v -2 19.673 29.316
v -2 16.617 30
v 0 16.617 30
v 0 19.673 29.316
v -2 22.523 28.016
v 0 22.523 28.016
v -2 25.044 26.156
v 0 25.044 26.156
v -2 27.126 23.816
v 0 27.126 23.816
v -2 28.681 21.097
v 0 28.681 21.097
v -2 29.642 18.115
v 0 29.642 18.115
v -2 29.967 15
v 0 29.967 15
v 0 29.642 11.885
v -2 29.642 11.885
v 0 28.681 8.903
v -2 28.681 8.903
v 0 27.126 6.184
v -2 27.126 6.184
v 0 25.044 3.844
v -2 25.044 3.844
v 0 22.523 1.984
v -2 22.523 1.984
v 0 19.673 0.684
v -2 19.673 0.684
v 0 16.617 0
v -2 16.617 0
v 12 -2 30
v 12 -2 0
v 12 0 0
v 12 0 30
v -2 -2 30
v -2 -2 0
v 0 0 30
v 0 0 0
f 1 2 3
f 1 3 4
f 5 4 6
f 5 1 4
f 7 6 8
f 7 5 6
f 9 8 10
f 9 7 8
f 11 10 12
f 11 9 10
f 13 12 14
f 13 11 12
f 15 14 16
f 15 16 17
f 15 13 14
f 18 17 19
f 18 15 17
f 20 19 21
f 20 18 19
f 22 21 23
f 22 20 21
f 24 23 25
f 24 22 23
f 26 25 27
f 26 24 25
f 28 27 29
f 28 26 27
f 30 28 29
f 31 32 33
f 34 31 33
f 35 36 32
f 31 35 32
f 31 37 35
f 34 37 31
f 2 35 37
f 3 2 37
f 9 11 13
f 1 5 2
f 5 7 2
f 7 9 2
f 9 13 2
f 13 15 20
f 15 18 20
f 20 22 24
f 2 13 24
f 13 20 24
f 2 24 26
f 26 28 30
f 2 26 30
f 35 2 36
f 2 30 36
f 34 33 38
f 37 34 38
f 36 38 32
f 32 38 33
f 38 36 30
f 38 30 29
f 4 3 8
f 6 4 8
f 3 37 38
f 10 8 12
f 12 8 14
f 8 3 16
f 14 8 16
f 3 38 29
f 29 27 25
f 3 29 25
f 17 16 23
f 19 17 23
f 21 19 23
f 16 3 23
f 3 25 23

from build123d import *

# Parameters (mm, degrees)
EXTRUDE_1_DEPTH     = 30
CUT_EXTRUDE_1_DEPTH = 45.676615807


with BuildPart() as part:
    # Эскиз1 → Вытянуть-Тонкостенный1 (new body)
    with BuildSketch(Plane.XY):
        Polygon((12, 0), (0, 0), (0, 30), (-2, 30), (-2, -2), (12, -2), align=None)
    extrude(amount=EXTRUDE_1_DEPTH)

    # Эскиз2 → Вытянуть1 (cut, through all)
    with BuildSketch(Plane.ZY.offset(2)):
        with BuildLine():
            Line((-0.098661396, 15.181132745), (-3.6788427, 15.181132745))
            Line((-3.6788427, 15.181132745), (-3.6788427, 31.57095784))
            Line((-3.6788427, 31.57095784), (33.600371965, 31.57095784))
            Line((33.600371965, 31.57095784), (33.600371965, 15.181132745))
            Line((33.600371965, 15.181132745), (30.098661396, 15.181132745))
            ThreePointArc((30.098661396, 15.181132745), (15, 29.966627674), (-0.098661396, 15.181132745))
        make_face()
    extrude(amount=-CUT_EXTRUDE_1_DEPTH, mode=Mode.SUBTRACT)


solid = part.part
